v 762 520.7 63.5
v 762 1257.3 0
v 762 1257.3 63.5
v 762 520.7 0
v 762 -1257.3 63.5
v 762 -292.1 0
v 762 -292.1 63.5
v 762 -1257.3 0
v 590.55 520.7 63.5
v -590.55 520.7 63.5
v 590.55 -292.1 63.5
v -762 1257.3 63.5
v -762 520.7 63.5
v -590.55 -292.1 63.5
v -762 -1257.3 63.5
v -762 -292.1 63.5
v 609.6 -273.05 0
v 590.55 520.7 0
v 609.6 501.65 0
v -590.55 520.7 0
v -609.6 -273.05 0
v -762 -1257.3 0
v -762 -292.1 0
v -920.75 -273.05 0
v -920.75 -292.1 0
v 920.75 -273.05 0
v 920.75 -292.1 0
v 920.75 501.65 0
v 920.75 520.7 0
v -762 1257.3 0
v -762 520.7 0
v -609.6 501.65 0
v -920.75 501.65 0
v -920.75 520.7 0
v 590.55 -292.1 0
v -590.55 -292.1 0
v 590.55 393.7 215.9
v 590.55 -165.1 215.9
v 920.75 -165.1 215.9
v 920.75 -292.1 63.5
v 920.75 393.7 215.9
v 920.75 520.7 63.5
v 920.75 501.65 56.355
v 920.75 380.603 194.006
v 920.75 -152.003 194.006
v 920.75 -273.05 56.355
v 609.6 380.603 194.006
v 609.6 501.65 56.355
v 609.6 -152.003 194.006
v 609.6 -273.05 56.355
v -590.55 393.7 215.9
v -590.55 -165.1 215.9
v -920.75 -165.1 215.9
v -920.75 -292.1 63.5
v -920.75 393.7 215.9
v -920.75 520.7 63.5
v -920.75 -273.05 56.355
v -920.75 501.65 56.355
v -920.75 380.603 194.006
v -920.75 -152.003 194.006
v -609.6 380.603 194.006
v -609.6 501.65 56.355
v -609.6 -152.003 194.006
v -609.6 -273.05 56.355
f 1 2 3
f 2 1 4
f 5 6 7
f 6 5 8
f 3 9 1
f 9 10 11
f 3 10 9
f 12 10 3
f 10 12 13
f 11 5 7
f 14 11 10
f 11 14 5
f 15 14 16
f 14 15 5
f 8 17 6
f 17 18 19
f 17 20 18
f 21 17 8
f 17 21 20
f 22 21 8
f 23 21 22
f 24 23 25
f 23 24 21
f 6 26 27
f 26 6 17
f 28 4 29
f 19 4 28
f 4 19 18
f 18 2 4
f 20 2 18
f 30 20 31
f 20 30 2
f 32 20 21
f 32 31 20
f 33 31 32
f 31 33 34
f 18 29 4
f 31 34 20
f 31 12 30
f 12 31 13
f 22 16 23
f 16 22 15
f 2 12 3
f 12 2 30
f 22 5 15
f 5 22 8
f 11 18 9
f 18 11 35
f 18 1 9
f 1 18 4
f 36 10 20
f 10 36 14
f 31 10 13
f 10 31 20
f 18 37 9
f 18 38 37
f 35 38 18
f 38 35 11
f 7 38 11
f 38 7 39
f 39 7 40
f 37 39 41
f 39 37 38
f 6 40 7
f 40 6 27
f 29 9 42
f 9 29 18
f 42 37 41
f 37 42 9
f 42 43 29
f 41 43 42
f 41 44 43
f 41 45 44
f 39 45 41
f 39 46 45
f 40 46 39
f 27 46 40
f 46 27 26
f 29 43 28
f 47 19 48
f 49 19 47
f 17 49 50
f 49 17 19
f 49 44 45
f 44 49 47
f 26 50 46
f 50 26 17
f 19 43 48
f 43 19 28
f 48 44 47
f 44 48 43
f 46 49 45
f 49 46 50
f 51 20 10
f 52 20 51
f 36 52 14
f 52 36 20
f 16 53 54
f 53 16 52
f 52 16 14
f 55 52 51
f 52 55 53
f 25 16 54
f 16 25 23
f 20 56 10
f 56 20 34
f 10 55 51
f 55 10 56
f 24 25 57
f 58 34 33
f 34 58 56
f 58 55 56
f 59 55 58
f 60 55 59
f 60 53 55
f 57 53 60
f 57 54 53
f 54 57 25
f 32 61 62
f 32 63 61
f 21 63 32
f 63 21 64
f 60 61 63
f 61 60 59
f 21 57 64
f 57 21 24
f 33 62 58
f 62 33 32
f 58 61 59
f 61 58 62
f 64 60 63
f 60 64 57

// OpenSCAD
// file: ../constants/trailer.scad
use <../lib/convert.scad>

FRAME_WIDTH = feet(4);
FRAME_LENGTH = feet(8);
FRAME_THICKNESS = inches(3);
AXEL_OFFSET_Y = inches(6);
// file: wheel_well.scad
use <../lib/convert.scad>
use <../lib/colors.scad>

wheel_well_top_width = inches(22);
wheel_well_base_width = inches(32);
wheel_well_depth = inches(13);
wheel_well_base_thickness = inches(2.5);
wheel_well_height = inches(6) + wheel_well_base_thickness - inches(0.75);


module wheel_well_cutout() {
  translate([0, 0, -1])
  translate([0, wheel_well_base_width / -2, 0])
  cube([wheel_well_depth + 1, wheel_well_base_width, wheel_well_base_thickness + 2]);
}

module wheel_well_shape() {
  color_wood()
  translate([0, wheel_well_base_width / -2, 0])
  hull() {
    translate([0, (wheel_well_base_width - wheel_well_top_width) / 2, wheel_well_height])
      cube([wheel_well_depth, wheel_well_top_width, inches(0.75)]);

    cube([wheel_well_depth, wheel_well_base_width, wheel_well_base_thickness]);
  }
}

module wheel_well_inside() {
  scale_y = (wheel_well_base_width - inches(1.5)) / wheel_well_base_width;
  scale_z = (wheel_well_height - inches(0.75)) / wheel_well_height;

  color_black()
  scale([1, scale_y, scale_z])
    wheel_well_shape();
}

module wheel_well() {
  difference() {
    wheel_well_shape();

    translate([inches(0.75), 0, -1])
      wheel_well_inside();
  }
}

wheel_well();
// file: ../lib/colors.scad
module color_wood() {
  color("#F8D89D")
    children();
}

module color_hdpe() {
  color("#ccd")
    children();
}

module color_steel() {
  color("#888")
    children();
}

module color_white() {
  color("#fafafa")
    children();
}

module color_black() {
  color("#333")
    children();
}

module color_outside() {
  color("#90b0c4")
    children();
}

module color_tinted_window() {
  color("#aac6")
    children();
}
// file: ../lib/convert.scad
function inches(in) = in * 25.4;
function feet(ft) = inches(ft * 12);
// main file
use <../lib/convert.scad>
use <../lib/colors.scad>
use <./wheel_well.scad>
include <../constants/trailer.scad>

floor_thickness = inches(2.5);
floor_width = feet(5);
floor_length = feet(8) + inches(3);
wheel_well_x_offset = feet(2) - inches(0.75);
wheel_well_y_offset = AXEL_OFFSET_Y - inches(1.5);

module teardrop_floor() {
  union() {
    color_wood()
    difference() {
      translate([0, 0, floor_thickness / 2])
        cube([floor_width, floor_length, floor_thickness], center = true);

      translate([wheel_well_x_offset, wheel_well_y_offset, 0])
        wheel_well_cutout();

      mirror([1, 0, 0])
      translate([wheel_well_x_offset, wheel_well_y_offset, 0])
        wheel_well_cutout();
    }

    translate([wheel_well_x_offset, wheel_well_y_offset, 0])
      wheel_well();

    mirror([1, 0, 0])
    translate([wheel_well_x_offset, wheel_well_y_offset, 0])
      wheel_well();
  }
}

teardrop_floor();
